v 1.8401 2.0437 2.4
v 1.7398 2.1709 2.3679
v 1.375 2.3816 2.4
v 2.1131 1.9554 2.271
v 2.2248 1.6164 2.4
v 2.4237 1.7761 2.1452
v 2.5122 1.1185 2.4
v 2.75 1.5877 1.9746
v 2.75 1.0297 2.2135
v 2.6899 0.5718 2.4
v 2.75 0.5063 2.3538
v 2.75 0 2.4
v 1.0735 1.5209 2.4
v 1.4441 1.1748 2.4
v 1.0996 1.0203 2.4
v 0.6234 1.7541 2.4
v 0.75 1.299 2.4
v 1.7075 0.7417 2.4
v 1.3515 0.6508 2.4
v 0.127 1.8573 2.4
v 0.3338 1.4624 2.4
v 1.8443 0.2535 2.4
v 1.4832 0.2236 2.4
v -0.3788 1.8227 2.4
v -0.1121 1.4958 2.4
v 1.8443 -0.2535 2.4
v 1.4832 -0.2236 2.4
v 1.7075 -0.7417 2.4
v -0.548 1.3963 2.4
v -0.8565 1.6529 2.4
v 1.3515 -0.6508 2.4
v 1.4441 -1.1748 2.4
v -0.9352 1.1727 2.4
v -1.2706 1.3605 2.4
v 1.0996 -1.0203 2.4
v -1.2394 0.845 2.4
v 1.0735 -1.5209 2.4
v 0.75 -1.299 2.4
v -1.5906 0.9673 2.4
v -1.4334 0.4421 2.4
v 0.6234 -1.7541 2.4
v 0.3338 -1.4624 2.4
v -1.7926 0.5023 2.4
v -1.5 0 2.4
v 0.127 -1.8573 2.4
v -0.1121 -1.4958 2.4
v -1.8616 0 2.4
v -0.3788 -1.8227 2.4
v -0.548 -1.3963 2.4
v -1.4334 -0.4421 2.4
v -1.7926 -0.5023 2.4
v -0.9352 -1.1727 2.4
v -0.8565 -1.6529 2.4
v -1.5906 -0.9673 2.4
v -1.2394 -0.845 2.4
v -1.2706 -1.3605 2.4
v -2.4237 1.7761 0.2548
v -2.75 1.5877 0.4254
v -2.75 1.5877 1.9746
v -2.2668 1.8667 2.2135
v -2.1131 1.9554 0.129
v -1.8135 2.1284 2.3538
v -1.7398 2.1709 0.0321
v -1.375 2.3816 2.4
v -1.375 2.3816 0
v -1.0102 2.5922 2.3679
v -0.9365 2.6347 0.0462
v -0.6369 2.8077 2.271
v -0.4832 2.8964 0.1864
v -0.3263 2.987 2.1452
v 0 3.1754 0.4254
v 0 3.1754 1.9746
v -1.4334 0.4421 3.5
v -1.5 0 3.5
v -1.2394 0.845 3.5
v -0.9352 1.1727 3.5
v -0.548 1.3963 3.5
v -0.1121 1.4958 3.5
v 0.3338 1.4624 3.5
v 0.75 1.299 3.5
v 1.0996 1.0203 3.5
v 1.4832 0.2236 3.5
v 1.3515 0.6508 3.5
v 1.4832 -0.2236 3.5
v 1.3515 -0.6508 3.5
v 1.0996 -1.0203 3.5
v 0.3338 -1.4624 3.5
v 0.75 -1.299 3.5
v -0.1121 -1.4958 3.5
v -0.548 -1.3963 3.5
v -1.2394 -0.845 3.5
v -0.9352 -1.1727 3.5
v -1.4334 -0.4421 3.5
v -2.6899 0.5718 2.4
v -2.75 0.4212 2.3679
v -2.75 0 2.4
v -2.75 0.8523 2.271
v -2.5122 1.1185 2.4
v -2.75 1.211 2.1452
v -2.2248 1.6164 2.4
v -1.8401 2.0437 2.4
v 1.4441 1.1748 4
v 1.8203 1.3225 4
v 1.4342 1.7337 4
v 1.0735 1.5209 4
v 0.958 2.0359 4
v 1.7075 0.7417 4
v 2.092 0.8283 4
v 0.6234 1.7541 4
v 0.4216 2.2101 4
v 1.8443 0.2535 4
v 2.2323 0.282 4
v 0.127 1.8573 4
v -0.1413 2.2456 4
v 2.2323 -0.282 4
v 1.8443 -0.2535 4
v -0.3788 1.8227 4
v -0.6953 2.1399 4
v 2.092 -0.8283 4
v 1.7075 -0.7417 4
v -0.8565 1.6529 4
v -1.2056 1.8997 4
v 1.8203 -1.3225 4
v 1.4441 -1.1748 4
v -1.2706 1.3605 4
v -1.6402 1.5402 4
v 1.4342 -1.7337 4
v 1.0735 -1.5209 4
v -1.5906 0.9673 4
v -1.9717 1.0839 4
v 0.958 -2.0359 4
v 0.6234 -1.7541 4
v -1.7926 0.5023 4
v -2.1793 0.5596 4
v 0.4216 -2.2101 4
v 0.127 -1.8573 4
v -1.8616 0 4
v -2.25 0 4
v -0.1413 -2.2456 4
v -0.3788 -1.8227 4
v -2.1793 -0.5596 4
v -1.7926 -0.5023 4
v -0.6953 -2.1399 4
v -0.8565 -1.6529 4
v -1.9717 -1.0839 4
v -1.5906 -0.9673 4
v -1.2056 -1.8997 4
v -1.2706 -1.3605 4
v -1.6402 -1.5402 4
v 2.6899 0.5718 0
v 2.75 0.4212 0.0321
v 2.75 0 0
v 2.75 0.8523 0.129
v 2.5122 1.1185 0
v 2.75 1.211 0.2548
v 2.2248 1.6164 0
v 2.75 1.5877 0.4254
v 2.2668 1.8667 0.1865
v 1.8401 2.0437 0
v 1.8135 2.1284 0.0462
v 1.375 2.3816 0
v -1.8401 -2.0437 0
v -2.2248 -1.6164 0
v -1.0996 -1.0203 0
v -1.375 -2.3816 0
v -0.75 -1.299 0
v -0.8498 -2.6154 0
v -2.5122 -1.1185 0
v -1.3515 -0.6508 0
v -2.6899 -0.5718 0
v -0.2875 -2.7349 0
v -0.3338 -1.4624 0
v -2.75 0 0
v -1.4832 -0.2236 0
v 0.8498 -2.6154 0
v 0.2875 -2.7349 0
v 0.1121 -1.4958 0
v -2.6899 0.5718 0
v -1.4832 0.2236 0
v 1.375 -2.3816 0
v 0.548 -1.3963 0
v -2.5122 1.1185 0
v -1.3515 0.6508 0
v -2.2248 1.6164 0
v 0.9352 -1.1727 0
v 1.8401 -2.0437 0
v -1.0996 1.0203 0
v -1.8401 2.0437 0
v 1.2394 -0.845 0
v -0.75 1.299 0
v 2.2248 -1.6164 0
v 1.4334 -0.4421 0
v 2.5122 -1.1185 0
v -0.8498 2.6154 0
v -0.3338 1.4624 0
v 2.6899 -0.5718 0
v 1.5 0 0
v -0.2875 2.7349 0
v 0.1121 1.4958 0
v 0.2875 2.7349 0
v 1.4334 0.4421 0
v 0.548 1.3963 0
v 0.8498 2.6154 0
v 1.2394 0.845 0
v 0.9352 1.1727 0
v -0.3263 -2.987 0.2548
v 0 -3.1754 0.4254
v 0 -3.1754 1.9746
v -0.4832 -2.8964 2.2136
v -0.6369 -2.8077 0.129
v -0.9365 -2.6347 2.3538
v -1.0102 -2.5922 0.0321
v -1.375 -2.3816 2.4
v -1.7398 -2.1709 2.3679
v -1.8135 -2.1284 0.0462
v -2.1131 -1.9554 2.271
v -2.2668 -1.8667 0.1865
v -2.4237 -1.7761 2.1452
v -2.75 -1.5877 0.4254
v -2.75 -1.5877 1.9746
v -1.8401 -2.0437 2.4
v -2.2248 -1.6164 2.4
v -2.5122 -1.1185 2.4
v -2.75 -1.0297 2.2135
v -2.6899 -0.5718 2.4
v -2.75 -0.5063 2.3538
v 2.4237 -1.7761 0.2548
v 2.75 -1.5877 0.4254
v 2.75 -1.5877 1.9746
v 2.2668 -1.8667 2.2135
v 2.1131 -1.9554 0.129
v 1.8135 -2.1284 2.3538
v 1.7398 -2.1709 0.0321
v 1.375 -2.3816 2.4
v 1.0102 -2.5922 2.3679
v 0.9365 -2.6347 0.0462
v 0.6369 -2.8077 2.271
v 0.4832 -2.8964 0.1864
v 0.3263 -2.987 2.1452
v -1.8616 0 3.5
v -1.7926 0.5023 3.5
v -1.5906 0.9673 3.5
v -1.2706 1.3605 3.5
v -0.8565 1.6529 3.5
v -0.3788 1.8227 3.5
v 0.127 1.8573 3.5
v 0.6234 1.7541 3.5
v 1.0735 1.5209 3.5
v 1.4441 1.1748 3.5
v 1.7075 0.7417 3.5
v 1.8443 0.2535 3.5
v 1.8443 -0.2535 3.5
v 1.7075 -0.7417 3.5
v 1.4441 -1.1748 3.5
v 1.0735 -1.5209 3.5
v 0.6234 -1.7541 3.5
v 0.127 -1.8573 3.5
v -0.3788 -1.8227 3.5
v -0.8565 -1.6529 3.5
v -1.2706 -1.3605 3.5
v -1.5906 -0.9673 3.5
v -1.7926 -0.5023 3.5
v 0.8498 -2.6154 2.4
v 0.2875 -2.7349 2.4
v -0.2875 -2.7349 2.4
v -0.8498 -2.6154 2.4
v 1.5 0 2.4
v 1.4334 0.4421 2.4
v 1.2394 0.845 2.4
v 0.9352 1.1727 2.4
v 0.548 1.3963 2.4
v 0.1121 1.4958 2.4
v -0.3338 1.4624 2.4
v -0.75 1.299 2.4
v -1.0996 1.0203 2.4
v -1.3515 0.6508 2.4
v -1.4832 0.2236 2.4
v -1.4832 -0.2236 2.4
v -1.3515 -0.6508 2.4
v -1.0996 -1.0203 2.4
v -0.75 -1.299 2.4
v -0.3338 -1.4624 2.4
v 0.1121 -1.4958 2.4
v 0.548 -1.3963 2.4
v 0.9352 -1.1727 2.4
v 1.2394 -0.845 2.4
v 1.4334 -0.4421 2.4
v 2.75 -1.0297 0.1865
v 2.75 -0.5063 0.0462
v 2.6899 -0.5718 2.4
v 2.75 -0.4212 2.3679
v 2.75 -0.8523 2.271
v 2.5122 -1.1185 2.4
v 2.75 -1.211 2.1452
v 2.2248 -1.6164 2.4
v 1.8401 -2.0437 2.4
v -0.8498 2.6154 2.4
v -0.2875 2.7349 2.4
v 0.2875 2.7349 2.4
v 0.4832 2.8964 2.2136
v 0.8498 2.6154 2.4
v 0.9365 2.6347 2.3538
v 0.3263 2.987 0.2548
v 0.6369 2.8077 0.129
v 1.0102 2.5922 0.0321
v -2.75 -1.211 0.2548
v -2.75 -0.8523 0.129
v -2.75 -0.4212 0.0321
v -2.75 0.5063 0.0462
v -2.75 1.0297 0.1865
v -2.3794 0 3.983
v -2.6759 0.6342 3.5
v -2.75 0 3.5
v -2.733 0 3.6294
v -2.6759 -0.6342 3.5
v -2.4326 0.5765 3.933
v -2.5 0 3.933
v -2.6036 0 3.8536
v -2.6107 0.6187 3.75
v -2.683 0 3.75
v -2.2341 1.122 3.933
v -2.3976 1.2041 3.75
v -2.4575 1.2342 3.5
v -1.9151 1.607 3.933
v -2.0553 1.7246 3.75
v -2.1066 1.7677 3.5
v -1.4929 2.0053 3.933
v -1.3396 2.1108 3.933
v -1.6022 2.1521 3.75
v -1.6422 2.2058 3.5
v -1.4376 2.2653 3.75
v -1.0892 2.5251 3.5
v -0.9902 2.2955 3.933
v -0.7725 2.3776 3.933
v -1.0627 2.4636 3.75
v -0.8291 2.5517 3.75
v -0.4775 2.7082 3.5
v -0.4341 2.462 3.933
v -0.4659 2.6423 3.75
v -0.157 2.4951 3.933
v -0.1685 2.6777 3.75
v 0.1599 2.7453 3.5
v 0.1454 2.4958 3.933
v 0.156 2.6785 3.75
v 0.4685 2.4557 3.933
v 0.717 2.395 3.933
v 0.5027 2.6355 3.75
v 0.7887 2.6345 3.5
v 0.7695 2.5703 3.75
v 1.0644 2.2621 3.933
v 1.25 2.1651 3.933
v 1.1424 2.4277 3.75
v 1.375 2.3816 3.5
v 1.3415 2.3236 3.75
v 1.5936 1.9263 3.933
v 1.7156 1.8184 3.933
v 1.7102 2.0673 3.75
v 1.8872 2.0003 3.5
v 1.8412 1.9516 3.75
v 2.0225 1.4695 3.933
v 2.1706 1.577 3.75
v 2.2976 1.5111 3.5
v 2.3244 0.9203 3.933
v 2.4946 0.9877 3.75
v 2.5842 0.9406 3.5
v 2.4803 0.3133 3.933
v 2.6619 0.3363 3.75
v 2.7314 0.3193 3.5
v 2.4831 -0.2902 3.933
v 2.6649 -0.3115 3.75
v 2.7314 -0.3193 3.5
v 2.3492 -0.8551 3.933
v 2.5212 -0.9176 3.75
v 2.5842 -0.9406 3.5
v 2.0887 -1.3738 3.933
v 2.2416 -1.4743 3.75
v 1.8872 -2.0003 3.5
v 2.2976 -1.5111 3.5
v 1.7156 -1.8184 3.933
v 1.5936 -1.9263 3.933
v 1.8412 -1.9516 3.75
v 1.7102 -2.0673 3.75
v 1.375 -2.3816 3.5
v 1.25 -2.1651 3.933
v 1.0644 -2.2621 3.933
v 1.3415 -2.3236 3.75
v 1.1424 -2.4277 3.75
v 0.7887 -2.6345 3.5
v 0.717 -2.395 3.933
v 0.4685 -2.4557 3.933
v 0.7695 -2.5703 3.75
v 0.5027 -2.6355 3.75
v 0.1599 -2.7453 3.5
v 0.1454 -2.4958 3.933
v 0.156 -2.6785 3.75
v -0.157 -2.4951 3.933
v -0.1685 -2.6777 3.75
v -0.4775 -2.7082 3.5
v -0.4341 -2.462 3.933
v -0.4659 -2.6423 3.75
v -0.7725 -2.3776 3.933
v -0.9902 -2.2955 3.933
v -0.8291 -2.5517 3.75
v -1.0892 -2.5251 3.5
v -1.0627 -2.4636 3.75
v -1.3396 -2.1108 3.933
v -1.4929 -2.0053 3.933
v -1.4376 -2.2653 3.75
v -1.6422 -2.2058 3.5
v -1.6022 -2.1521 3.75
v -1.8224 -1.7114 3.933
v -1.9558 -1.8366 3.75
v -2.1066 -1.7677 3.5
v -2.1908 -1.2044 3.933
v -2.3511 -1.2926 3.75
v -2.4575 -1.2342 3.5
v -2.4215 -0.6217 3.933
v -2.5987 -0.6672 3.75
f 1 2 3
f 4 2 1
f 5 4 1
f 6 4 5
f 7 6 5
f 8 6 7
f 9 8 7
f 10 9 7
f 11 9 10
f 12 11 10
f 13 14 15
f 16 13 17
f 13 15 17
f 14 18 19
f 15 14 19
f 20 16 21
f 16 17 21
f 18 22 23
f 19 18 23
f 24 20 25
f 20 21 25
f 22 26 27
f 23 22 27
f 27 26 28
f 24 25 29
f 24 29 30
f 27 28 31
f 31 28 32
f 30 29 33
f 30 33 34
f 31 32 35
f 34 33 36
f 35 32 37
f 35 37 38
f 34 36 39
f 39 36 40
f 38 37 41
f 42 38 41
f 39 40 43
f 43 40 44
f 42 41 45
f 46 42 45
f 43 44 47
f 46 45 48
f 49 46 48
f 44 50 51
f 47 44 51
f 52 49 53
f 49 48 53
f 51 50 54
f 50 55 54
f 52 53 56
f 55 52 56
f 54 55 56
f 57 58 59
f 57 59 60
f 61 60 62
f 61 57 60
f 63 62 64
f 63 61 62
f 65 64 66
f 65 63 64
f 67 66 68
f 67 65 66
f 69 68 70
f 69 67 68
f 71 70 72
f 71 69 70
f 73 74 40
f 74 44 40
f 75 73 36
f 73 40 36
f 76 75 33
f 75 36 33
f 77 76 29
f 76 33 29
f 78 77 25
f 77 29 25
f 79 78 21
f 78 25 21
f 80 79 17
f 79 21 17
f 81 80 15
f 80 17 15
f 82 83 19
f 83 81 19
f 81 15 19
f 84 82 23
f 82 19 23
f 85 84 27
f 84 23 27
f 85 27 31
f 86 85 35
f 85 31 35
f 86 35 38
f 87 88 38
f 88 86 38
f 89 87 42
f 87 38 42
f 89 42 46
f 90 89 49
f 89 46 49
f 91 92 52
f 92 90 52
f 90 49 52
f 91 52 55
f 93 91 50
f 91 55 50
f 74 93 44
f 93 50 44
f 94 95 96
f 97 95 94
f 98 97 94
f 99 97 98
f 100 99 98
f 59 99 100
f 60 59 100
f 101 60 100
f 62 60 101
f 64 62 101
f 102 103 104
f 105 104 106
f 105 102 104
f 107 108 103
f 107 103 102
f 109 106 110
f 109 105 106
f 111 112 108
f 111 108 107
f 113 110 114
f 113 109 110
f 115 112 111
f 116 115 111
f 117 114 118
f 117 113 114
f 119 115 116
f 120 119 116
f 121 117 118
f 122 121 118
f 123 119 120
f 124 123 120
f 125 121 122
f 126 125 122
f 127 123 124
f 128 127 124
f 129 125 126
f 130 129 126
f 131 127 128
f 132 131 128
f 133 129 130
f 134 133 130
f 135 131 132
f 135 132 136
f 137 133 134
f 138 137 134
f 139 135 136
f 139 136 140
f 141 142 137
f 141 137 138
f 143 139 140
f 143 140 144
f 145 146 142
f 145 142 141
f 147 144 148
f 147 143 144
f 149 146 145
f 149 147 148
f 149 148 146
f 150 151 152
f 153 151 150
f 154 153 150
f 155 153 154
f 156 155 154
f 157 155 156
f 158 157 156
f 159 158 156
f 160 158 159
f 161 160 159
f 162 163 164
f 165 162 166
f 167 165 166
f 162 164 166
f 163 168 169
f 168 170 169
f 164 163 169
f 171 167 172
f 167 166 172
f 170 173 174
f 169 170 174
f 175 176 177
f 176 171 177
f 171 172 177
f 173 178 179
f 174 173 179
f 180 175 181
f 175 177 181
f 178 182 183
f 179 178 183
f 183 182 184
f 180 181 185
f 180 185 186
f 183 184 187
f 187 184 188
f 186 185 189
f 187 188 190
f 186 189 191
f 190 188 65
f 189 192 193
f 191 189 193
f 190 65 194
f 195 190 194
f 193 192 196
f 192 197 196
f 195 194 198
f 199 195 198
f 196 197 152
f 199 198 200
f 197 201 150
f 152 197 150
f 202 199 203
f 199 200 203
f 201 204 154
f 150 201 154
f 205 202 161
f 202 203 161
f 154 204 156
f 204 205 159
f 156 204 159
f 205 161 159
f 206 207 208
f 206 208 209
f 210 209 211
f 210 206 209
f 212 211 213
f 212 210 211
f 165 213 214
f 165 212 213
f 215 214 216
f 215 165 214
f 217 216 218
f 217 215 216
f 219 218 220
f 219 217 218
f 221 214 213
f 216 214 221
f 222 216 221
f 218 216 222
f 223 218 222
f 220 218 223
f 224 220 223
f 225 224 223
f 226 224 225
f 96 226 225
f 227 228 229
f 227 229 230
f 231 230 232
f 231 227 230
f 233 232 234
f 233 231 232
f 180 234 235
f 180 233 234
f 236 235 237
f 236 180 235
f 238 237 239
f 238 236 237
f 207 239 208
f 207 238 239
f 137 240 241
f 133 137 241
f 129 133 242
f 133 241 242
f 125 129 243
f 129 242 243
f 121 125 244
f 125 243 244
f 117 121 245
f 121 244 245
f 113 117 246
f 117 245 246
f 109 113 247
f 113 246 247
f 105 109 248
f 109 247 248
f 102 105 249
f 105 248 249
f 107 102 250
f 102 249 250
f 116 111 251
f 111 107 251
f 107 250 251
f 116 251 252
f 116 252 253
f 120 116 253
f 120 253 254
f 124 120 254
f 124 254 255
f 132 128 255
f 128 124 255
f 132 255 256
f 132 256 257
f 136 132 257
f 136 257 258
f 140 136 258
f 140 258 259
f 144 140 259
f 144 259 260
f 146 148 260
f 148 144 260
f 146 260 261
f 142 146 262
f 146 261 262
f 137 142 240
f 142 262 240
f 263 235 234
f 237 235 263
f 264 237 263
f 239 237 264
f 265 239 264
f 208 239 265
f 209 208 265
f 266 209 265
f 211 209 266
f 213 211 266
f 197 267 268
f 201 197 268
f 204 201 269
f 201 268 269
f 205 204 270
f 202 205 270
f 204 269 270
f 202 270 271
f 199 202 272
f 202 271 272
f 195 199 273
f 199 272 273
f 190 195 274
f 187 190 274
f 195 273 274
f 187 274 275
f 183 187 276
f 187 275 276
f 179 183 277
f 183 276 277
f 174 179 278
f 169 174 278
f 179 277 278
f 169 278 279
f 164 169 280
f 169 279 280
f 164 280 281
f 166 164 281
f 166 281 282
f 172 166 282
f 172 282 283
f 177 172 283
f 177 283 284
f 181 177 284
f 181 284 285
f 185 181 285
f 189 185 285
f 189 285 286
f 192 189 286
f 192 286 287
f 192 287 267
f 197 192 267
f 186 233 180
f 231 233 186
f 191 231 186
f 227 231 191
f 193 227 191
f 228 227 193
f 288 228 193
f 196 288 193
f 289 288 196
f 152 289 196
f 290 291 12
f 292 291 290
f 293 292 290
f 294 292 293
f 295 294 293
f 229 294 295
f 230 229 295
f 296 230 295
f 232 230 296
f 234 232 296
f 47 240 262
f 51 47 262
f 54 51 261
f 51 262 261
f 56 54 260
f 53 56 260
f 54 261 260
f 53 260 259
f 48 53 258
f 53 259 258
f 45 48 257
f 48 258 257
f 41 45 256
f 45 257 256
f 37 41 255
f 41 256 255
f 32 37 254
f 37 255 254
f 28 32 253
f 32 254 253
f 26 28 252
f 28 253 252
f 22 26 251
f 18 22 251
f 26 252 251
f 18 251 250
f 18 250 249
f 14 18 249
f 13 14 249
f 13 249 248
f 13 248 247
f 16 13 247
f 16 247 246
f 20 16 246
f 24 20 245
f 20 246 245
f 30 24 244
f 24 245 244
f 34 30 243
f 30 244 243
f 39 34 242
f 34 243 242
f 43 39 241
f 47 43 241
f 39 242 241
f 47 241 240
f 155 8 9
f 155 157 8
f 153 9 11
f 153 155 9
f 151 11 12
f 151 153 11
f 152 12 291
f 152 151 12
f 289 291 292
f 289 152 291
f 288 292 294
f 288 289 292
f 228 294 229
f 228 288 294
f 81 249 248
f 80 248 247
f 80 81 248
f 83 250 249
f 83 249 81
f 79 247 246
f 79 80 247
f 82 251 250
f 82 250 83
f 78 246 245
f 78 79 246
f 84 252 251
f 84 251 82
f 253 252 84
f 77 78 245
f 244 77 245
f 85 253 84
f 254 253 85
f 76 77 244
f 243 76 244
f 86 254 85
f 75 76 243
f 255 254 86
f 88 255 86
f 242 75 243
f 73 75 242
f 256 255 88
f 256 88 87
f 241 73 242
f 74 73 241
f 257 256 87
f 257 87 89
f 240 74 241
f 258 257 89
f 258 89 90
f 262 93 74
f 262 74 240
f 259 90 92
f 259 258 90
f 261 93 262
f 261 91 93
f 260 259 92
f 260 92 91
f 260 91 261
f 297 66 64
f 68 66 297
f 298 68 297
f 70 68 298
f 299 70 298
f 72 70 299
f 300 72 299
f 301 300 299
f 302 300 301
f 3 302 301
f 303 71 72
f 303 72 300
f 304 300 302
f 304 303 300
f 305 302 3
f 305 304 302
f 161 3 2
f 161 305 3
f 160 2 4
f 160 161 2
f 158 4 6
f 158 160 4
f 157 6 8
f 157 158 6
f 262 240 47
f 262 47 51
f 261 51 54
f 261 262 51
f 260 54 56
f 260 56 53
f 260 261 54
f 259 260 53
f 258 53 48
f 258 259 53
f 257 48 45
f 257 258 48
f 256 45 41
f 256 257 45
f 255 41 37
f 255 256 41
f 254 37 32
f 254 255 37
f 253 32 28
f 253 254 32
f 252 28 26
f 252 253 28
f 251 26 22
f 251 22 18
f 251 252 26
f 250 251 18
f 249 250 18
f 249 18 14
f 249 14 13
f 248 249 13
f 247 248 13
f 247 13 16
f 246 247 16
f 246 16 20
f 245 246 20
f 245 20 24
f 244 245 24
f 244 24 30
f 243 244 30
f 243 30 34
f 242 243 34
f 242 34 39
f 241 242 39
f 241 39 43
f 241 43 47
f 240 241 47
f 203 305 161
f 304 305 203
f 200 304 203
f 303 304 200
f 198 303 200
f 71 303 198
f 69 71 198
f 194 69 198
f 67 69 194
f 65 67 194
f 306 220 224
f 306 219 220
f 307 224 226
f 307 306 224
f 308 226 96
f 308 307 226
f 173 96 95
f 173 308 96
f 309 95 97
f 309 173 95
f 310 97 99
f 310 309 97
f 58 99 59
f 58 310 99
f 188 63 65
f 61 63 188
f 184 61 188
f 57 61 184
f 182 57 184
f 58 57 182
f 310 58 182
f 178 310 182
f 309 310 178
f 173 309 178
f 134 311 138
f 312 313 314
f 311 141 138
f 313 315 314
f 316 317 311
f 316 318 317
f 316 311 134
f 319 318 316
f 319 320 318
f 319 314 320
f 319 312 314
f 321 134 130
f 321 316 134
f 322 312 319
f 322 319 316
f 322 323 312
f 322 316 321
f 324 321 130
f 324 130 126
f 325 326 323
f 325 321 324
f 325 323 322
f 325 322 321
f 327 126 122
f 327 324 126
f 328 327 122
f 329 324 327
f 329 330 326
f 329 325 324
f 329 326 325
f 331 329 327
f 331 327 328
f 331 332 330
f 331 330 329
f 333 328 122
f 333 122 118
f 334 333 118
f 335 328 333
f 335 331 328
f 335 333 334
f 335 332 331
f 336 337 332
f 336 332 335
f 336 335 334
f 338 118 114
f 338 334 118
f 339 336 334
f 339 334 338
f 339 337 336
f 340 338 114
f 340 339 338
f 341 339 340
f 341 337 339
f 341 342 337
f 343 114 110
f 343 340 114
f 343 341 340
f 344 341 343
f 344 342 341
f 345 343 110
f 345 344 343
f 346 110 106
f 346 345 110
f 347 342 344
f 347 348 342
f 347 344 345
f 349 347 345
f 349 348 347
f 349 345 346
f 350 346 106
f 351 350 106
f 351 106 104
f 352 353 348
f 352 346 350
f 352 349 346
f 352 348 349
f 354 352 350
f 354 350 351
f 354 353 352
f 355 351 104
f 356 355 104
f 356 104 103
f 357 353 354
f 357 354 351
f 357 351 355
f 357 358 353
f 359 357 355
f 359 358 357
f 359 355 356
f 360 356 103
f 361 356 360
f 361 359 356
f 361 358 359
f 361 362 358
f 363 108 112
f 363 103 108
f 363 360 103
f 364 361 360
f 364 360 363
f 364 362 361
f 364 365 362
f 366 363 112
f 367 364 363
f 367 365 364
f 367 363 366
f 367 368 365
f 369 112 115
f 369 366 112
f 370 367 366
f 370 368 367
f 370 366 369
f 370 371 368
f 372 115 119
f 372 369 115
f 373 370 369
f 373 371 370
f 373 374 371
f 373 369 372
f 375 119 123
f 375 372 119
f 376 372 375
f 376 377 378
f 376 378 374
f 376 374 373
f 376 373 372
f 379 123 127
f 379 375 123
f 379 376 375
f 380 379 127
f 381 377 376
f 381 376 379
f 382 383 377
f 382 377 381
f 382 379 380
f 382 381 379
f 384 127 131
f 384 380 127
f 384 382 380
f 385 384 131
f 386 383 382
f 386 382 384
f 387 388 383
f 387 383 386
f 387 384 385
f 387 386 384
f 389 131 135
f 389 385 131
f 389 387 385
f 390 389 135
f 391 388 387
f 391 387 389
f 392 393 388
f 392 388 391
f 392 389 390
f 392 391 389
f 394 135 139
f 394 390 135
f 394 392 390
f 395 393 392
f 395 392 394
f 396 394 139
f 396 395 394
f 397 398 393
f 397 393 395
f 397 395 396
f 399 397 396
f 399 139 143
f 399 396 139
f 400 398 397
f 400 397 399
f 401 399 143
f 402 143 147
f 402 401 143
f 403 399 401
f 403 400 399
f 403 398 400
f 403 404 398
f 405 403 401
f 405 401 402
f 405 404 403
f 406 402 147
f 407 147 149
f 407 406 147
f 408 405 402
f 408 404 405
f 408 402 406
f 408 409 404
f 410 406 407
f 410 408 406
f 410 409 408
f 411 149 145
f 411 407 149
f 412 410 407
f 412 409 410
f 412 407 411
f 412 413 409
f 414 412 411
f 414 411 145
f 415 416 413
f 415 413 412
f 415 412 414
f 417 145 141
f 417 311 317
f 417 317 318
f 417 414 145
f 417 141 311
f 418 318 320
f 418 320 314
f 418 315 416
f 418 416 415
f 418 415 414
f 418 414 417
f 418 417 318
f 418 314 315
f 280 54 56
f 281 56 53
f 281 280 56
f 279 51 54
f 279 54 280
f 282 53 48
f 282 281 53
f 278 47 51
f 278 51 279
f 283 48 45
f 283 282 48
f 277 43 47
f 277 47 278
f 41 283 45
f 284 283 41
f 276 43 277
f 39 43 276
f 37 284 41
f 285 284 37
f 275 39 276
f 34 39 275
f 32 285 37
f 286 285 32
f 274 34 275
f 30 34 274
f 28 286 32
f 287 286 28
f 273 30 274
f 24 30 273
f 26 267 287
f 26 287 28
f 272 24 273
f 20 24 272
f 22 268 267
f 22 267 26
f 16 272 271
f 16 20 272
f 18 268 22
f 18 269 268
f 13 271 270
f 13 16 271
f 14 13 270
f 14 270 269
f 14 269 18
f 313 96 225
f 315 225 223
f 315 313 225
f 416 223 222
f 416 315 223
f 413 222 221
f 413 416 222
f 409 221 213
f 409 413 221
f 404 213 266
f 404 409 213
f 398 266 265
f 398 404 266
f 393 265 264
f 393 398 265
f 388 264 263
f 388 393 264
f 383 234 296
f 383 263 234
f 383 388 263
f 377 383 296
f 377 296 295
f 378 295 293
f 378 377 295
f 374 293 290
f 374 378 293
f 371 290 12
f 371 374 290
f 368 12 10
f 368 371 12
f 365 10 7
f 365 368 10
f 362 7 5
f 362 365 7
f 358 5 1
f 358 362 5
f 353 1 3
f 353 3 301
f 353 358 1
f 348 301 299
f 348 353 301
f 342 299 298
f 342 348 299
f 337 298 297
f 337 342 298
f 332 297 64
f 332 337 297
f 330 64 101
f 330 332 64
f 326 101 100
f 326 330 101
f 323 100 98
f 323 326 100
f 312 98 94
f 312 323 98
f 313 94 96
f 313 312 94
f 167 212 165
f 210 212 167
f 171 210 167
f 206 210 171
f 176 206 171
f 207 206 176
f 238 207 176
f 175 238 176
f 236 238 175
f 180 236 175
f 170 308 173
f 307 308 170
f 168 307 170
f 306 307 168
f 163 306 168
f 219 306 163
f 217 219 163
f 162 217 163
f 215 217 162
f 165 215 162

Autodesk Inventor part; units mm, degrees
ref_plane "YZ Plane" through (0, 0, 0) normal (1, 0, 0) x (0, 1, 0)
ref_plane "XZ Plane" through (0, 0, 0) normal (0, 1, 0) x (-1, 0, 0)
ref_plane "XY Plane" through (0, 0, 0) normal (0, 0, 1) x (1, 0, 0)
sketch "Sketch1" plane through (0, 0, 0) normal (0, 0, 1) x (1, 0, 0)
  line L0 (0, 3.1754) -> (2.75, 1.5877)
  line L1 (2.75, 1.5877) -> (2.75, -1.5877)
  line L2 (2.75, -1.5877) -> (0, -3.1754)
  line L3 (0, -3.1754) -> (-2.75, -1.5877)
  line L4 (-2.75, -1.5877) -> (-2.75, 1.5877)
  line L5 (-2.75, 1.5877) -> (0, 3.1754)
  point P0 (0, 0)
  point P1 (0, 0)
  dimension "d0" = 5.5
extrude "Main Body" add sketch "Sketch1" along normal blind 2.4
sketch "Sketch2" plane through (0, 0, 2.4) normal (0, 0, 1) x (1, 0, 0)
  circle A0 centre (0, 0) radius 2.75
  line L0 (2.75, -1.5877) -> (2.75, 1.5877) construction
  point P0 (2.75, 0)
extrude "Front Taper" cut sketch "Sketch2" against normal up to surface (2.4 mm away) draft 45 keep common part
sketch "Sketch3" plane through (0, 0, 0) normal (0, 0, -1) x (-1, 0, 0)
  circle A0 centre (0, 0) radius 2.75
  line L0 (-2.75, -1.5877) -> (-2.75, 1.5877) projected
  point P0 (-2.75, 0)
extrude "Back Taper" cut sketch "Sketch3" against normal up to surface (2.4 mm away) draft 45 keep common part
sketch "Sketch4" plane through (0, 0, 2.4) normal (0, 0, 1) x (1, 0, 0)
  circle A0 centre (0, 0) radius 1.5
  dimension "d9" = 3
extrude "Center Hole" cut sketch "Sketch4" against normal up to surface (2.4 mm away)
sketch "Sketch6" plane through (0, 0, 0) normal (0, 1, 0) x (-1, 0, 0)
  line L0 (-2.75, 0) -> (-2.75, 2.4) projected
  line L1 (-2.75, 2.4) -> (-1.5, 2.4) projected
  line L2 (-1.5, 0) -> (-2.75, 0) projected
  line L3 (2.75, 2.4) -> (2.75, 0) projected
  line L4 (2.75, 0) -> (1.5, 0) projected
  line L5 (1.5, 2.4) -> (2.75, 2.4) projected
  line L6 (1.5, 2.4) -> (1.8616, 2.4)
  line L7 (1.8616, 2.4) -> (1.8616, 3.5)
  line L8 (1.8616, 3.5) -> (1.5, 3.5)
  line L9 (1.5, 3.5) -> (1.5, 2.4)
  line L10 (1.8616, 2.4) -> (2.75, 2.4)
  line L11 (2.75, 2.4) -> (2.75, 4)
  line L12 (2.75, 4) -> (1.8616, 4)
  line L13 (1.8616, 4) -> (1.8616, 2.4)
  line L14 (0, -1.0258) -> (0, 4.8376) projected
  line L15 (-1.5, 2.4) -> (-1.5, 0) projected
  line L16 (1.5, 0) -> (1.5, 2.4) projected
  point P0 (0, 0)
  dimension "d35" = 0.3616
  dimension "d36" = 1.6
  dimension "d37" = 0.5
revolve "Locking Cap" add sketch "Sketch6" angle 360 about axis through (0, 0, -10) along (0, 0, 1) contours L5 L7 L13 L12 L11
fillet "Fillet1" radius 0.5 1 edges at (2.75, 0, 4)
revolve "Nylon Locking" add sketch "Sketch6" angle 360 about axis through (0, 0, -10) along (0, 0, 1) separate body contours L5 L9 L8 L7
thread "Thread1" size "M3x0.5" class "6H" standard "ANSI Metric M Profile" full length
sketch "Sketch5" plane through (0, 0, 0) normal (1, 0, 0) x (0, 1, 0)
  line L0 (-1.8259, 3.2833) -> (-1.5, 3.4714)
  line L1 (-1.5, 3.4714) -> (-1.5, 2.9714)
  line L2 (-1.5, 2.9714) -> (-1.8259, 3.1596)
  line L3 (-1.933, 3.2214) -> (-1.5, 3.2214) construction
  line L4 (-1.5, 2.4) -> (1.5, 2.4) construction
  arc A0 (-1.8259, 3.2833) -> (-1.8259, 3.1596) centre (-1.7902, 3.2214) ccw
  point P0 (0, 0)
  point P1 (-1.6443, 3.2214)
  point P2 (-1.8616, 3.2214)
  dimension "d14" = 0.5
  dimension "d15" = 0.5714
  dimension "d16" = 0
  dimension "d17" = 0.0714
  dimension "d33" = 0.3616
coil "Coil1" [suppressed]
equation "\"d0\" = size"
equation "\"d1\" = sideHeight"
equation "\"d9\" = nominalDiameter"
equation "\"d35\" = d33"
equation "\"d36\" = lockingHeight"
equation "\"d37\" = threadPitch"
equation "\"d40\" = d37"
equation "\"d14\" = threadPitch"
equation "\"d15\" = 1.14286 * threadPitch"
equation "\"d17\" = 0.142857 * threadPitch"
equation "\"d18\" = threadPitch"
equation "\"d19\" = 1.57143 * sideHeight"
equation "\"size\" = 5.5"
equation "\"sideHeight\" = 2.4"
equation "\"nominalDiameter\" = 3"
equation "\"threadPitch\" = 0.5"
equation "\"thickness\" = 4"
equation "\"lockingHeight\" = thickness - sideHeight"
equation "\"d29\" = 0.5 * size - 0.5 * nominalDiameter - threadPitch"
properties part number "M1.6" material "Steel, Galvanized"
